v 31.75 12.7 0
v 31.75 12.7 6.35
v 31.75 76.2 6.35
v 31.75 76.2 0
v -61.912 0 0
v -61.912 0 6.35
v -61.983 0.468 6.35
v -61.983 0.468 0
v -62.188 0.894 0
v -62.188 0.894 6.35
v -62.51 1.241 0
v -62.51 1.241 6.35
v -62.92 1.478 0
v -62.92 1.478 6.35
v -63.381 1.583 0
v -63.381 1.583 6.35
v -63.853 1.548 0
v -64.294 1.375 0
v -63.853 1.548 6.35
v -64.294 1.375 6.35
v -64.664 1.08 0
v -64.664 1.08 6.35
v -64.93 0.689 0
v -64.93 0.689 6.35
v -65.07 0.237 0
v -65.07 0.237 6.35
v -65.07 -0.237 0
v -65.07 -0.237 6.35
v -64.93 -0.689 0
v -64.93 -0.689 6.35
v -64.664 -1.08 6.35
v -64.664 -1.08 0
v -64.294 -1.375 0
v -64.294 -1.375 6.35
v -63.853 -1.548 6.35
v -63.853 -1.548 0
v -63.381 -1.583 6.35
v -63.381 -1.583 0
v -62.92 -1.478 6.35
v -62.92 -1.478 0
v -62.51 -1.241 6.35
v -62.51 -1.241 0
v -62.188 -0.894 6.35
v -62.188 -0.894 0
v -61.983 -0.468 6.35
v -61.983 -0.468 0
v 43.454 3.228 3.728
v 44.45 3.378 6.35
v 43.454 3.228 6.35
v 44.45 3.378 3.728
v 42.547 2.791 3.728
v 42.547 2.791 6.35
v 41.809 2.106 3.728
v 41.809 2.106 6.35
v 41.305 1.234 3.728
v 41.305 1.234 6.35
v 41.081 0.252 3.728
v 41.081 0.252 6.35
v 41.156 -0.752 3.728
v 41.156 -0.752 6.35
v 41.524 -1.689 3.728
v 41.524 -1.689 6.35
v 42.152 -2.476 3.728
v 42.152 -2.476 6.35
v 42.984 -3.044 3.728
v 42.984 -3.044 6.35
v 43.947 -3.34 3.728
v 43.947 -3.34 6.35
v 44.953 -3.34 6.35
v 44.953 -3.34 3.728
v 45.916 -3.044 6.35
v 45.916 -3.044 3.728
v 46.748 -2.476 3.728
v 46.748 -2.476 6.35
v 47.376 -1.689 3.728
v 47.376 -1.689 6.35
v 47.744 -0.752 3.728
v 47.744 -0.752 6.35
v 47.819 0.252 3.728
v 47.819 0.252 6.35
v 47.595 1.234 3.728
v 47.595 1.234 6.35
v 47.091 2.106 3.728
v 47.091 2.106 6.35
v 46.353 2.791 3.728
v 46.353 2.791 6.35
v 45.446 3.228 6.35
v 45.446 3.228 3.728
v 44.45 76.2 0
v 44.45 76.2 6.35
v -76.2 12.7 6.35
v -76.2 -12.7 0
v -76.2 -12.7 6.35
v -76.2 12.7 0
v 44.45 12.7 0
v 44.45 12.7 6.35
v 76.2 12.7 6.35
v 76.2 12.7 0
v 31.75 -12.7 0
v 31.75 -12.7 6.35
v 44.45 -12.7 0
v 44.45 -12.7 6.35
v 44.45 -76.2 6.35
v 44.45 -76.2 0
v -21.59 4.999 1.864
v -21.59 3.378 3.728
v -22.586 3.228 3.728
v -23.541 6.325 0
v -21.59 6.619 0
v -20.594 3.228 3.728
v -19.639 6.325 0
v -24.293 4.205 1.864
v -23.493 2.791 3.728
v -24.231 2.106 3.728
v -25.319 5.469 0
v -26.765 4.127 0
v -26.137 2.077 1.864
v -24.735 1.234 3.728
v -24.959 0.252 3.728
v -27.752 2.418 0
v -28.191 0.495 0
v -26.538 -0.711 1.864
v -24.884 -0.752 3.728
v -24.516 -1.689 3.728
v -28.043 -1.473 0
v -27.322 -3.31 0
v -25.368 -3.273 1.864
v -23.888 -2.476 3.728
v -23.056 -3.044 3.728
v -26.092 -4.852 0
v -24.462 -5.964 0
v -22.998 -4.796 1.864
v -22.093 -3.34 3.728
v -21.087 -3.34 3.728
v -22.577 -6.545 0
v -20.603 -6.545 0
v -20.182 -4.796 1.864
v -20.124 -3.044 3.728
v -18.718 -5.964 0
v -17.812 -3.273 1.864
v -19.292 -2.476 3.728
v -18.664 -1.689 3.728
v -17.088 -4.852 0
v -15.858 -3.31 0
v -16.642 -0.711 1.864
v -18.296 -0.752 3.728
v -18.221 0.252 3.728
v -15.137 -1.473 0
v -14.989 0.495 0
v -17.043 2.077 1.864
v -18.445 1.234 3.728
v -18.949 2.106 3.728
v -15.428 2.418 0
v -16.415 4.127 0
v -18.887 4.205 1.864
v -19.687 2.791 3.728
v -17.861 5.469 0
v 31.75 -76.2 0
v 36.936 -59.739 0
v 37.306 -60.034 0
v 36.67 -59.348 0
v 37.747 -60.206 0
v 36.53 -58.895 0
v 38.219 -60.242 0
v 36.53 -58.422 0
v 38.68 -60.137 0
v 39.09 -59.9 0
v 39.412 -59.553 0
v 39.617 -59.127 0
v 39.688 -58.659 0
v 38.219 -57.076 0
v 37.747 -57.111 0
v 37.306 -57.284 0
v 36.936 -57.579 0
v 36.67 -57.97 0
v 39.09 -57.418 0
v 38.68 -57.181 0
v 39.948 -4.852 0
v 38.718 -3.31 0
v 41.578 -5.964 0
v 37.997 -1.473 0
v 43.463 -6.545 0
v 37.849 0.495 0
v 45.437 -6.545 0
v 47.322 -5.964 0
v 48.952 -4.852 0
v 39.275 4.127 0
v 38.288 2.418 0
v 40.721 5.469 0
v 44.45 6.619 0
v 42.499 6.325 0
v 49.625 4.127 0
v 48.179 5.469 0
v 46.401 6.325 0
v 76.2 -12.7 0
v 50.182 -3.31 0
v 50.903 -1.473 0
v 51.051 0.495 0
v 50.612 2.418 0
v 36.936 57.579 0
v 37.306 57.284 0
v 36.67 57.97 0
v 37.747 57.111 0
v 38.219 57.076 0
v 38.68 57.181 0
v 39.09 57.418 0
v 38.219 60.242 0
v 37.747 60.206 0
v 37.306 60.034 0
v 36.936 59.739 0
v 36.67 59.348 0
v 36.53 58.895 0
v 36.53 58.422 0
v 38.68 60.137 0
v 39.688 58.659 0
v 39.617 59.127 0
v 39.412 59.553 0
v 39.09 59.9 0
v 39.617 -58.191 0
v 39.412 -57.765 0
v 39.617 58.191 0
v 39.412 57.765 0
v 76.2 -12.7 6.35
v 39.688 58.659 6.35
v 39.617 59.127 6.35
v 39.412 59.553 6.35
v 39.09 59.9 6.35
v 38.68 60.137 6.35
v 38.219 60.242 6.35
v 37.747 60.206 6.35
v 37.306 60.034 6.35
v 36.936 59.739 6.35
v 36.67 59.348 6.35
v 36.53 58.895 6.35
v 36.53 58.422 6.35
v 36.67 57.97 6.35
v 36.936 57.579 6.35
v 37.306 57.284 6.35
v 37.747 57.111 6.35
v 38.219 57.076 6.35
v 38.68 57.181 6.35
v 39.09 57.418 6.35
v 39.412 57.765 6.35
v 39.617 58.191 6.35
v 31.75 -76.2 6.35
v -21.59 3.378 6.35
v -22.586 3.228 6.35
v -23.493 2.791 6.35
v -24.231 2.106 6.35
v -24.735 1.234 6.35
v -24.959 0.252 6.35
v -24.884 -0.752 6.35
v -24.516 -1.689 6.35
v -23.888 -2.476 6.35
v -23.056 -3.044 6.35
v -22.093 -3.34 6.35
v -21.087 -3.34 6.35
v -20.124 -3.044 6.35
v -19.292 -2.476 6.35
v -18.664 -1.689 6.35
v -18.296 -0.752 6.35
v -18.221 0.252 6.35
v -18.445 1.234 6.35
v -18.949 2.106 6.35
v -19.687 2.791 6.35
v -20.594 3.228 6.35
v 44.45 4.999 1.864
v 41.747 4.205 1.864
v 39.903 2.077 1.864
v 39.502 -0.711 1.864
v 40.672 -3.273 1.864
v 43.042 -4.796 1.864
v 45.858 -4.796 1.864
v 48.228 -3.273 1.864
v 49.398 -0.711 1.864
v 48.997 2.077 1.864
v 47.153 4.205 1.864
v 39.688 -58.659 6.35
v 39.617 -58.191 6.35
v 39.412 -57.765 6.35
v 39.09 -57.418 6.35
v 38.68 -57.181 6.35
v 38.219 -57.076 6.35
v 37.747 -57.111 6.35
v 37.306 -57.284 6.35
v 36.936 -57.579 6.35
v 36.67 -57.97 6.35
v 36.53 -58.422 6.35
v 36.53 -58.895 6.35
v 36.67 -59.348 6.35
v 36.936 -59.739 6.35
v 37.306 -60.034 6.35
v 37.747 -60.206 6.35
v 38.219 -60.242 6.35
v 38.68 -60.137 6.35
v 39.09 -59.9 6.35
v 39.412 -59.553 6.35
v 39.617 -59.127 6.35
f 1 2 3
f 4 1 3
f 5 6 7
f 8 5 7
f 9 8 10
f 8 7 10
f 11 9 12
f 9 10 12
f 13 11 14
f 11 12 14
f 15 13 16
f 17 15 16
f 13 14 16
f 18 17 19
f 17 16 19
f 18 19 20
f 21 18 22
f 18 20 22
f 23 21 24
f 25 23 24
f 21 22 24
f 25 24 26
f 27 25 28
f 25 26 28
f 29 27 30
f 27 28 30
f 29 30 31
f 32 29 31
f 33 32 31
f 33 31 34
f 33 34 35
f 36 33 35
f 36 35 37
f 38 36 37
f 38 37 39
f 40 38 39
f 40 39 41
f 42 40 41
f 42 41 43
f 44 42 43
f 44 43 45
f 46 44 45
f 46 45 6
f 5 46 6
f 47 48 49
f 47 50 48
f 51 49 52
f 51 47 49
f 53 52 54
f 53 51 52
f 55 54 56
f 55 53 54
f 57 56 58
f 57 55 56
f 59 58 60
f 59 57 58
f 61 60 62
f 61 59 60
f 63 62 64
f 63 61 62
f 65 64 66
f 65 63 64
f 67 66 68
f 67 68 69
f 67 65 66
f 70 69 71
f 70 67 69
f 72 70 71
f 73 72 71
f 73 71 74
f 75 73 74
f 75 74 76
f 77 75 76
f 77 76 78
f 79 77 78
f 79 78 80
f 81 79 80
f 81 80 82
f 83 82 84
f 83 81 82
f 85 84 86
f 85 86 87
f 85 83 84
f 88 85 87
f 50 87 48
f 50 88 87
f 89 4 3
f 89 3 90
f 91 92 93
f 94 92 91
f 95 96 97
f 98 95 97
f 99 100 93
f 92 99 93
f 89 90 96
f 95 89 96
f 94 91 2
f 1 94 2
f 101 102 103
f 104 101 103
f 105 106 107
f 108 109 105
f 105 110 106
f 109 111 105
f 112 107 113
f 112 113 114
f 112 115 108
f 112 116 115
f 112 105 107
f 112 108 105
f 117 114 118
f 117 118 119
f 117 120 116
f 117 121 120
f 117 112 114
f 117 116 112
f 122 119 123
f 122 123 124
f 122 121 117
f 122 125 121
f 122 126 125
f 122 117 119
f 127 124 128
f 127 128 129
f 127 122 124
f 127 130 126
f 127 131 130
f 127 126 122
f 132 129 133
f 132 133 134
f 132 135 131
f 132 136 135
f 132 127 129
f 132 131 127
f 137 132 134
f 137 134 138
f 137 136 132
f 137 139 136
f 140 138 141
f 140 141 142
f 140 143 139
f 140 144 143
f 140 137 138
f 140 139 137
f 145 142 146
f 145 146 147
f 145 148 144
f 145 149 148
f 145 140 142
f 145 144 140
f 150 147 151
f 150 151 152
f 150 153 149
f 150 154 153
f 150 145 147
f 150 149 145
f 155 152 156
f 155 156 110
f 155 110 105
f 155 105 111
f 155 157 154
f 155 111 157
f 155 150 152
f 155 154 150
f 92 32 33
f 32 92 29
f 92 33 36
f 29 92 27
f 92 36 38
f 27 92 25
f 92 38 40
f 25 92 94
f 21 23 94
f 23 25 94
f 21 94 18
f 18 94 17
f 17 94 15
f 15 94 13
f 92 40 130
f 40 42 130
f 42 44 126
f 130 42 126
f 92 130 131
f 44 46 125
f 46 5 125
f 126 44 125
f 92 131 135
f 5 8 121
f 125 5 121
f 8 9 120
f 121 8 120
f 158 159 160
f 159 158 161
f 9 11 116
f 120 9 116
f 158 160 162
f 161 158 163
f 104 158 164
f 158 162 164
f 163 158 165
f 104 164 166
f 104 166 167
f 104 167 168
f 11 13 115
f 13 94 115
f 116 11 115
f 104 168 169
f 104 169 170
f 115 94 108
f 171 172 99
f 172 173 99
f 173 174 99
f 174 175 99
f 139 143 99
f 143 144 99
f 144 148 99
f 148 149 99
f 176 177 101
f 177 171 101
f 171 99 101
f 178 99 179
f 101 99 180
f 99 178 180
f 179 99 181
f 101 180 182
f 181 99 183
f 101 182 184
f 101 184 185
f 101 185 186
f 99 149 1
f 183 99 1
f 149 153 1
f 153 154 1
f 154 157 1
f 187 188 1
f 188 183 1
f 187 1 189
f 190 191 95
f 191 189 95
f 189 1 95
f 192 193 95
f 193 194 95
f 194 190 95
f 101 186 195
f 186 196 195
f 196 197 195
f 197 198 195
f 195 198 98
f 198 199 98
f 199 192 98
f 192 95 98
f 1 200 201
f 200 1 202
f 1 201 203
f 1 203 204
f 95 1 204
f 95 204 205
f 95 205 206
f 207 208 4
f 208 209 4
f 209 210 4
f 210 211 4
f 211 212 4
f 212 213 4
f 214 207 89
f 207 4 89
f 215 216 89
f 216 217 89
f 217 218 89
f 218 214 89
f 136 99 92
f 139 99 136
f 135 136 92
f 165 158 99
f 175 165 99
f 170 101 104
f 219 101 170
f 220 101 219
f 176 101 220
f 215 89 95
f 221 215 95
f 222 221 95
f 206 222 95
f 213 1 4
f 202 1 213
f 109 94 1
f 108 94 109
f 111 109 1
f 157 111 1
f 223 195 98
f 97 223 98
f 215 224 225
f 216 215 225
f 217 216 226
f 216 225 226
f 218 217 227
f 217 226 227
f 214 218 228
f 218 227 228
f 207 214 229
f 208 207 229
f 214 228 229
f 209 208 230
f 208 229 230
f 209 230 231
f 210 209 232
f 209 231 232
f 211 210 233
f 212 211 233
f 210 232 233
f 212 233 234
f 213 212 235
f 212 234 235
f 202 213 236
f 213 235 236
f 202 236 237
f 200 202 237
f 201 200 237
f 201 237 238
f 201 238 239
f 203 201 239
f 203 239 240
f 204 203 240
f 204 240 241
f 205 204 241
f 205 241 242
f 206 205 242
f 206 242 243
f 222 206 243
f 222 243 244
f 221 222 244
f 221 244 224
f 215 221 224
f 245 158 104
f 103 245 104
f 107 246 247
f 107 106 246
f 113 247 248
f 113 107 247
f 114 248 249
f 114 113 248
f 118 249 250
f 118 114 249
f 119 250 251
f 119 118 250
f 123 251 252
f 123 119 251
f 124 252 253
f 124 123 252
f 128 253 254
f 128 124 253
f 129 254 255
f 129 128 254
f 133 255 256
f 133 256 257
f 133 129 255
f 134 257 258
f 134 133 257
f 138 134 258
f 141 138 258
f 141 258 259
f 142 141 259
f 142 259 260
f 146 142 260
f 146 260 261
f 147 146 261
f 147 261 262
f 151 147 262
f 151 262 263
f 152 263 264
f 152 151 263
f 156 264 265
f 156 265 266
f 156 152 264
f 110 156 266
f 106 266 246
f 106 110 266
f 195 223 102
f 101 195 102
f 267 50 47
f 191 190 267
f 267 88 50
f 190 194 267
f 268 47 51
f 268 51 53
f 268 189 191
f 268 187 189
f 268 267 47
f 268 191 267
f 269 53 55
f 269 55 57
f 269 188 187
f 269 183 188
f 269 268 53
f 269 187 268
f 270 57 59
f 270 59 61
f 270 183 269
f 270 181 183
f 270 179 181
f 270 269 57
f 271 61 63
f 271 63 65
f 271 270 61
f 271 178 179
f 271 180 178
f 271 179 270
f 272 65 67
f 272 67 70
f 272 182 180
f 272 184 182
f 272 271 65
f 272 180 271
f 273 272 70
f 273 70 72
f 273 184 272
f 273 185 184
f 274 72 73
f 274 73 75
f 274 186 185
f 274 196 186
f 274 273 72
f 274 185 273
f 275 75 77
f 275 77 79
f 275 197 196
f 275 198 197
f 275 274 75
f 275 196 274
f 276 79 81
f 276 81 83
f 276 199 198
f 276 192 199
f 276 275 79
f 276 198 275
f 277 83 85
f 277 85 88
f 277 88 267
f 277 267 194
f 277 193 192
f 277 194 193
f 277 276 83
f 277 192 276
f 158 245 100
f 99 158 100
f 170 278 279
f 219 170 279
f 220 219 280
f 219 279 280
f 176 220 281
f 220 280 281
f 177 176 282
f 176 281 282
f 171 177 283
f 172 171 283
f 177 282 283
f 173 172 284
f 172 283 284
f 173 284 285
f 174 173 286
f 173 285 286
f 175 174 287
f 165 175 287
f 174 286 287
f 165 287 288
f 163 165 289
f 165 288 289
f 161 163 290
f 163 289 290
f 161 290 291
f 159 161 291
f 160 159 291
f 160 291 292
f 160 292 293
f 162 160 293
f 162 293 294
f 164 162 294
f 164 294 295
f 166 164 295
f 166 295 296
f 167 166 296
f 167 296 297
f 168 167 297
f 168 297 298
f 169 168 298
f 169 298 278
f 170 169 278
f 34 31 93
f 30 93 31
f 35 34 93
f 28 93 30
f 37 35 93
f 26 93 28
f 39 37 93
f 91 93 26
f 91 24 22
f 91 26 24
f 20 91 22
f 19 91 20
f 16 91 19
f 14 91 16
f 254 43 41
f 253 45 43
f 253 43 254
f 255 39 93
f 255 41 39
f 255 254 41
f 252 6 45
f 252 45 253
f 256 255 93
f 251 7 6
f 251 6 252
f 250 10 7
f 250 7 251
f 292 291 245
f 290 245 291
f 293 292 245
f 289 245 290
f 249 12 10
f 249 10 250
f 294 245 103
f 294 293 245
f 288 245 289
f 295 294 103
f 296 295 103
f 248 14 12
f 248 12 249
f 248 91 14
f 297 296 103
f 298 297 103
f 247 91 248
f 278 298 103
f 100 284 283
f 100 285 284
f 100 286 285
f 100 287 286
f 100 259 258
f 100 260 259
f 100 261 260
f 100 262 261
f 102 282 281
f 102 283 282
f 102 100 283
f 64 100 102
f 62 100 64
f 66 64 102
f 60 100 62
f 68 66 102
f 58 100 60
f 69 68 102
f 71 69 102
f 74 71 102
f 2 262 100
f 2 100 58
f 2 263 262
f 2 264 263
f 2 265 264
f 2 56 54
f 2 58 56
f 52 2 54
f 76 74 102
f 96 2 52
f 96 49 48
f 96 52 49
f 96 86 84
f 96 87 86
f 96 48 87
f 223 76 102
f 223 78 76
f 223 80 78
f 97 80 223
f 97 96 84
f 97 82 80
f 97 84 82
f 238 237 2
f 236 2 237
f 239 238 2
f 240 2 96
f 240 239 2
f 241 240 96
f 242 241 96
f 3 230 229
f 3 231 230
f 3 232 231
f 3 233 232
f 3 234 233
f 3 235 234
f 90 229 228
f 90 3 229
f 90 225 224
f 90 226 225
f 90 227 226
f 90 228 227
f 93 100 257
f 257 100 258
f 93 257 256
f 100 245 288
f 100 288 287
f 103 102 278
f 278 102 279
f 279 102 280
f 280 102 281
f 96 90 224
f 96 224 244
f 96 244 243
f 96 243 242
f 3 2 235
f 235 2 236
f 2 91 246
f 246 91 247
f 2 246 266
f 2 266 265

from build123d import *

# Parameters (mm, degrees)
SKETCH1_W         = 152.4
SKETCH1_H         = 152.4
EXTRUDE1_DEPTH    = 6.35
SKETCH2_R         = 1.5875
EXTRUDE2_DEPTH    = 108.95
SKETCH3_OUTSIDE_W = 197.524
SKETCH3_OUTSIDE_H = 197.524
EXTRUDE3_DEPTH    = 108.95


with BuildPart() as part:
    # Sketch1 → Extrude1 (new body)
    with BuildSketch(Plane.XY):
        Rectangle(SKETCH1_W, SKETCH1_H)
    extrude(amount=EXTRUDE1_DEPTH)

    # Sketch2 → Extrude2 (cut, through all)
    with BuildSketch(Plane.XY.offset(6.35)):
        with Locations((-63.5, 0)):
            Circle(SKETCH2_R)
        with Locations((38.1, 58.65878735)):
            Circle(SKETCH2_R)
        with Locations((38.1, -58.65878735)):
            Circle(SKETCH2_R)
    extrude(amount=-EXTRUDE2_DEPTH, mode=Mode.SUBTRACT)

    # Sketch3 outside → Extrude3 (cut, through all)
    with BuildSketch(Plane.XY.offset(6.35)):
        Rectangle(SKETCH3_OUTSIDE_W, SKETCH3_OUTSIDE_H)
        Polygon((-76.2, 12.7), (31.75, 12.7), (31.75, 76.2), (44.45, 76.2), (44.45, 12.7), (76.2, 12.7), (76.2, -12.7), (44.45, -12.7), (44.45, -76.2), (31.75, -76.2), (31.75, -12.7), (-76.2, -12.7), align=None, mode=Mode.SUBTRACT)
    extrude(amount=-EXTRUDE3_DEPTH, mode=Mode.SUBTRACT)

    # Sketch5 → CSK for 1/4 Flat Head Socket Cap Screw1 (revolve, cut)
    with BuildSketch(Plane.YZ.offset(-21.59)):
        Polygon((0, 0), (0, 6.35), (3.3782, 6.35), (3.3782, 3.728390023), (6.61924, 0), align=None)
    revolve(axis=Axis((-21.59, 0, -6.35), (0, 0, 1)), mode=Mode.SUBTRACT)

    # Sketch7 → CSK for 1/4 Flat Head Socket Cap Screw2 (revolve, cut)
    with BuildSketch(Plane.YZ.offset(44.45)):
        Polygon((0, 0), (0, 6.35), (3.3782, 6.35), (3.3782, 3.728390023), (6.61924, 0), align=None)
    revolve(axis=Axis((44.45, 0, -6.35), (0, 0, 1)), mode=Mode.SUBTRACT)


solid = part.part
